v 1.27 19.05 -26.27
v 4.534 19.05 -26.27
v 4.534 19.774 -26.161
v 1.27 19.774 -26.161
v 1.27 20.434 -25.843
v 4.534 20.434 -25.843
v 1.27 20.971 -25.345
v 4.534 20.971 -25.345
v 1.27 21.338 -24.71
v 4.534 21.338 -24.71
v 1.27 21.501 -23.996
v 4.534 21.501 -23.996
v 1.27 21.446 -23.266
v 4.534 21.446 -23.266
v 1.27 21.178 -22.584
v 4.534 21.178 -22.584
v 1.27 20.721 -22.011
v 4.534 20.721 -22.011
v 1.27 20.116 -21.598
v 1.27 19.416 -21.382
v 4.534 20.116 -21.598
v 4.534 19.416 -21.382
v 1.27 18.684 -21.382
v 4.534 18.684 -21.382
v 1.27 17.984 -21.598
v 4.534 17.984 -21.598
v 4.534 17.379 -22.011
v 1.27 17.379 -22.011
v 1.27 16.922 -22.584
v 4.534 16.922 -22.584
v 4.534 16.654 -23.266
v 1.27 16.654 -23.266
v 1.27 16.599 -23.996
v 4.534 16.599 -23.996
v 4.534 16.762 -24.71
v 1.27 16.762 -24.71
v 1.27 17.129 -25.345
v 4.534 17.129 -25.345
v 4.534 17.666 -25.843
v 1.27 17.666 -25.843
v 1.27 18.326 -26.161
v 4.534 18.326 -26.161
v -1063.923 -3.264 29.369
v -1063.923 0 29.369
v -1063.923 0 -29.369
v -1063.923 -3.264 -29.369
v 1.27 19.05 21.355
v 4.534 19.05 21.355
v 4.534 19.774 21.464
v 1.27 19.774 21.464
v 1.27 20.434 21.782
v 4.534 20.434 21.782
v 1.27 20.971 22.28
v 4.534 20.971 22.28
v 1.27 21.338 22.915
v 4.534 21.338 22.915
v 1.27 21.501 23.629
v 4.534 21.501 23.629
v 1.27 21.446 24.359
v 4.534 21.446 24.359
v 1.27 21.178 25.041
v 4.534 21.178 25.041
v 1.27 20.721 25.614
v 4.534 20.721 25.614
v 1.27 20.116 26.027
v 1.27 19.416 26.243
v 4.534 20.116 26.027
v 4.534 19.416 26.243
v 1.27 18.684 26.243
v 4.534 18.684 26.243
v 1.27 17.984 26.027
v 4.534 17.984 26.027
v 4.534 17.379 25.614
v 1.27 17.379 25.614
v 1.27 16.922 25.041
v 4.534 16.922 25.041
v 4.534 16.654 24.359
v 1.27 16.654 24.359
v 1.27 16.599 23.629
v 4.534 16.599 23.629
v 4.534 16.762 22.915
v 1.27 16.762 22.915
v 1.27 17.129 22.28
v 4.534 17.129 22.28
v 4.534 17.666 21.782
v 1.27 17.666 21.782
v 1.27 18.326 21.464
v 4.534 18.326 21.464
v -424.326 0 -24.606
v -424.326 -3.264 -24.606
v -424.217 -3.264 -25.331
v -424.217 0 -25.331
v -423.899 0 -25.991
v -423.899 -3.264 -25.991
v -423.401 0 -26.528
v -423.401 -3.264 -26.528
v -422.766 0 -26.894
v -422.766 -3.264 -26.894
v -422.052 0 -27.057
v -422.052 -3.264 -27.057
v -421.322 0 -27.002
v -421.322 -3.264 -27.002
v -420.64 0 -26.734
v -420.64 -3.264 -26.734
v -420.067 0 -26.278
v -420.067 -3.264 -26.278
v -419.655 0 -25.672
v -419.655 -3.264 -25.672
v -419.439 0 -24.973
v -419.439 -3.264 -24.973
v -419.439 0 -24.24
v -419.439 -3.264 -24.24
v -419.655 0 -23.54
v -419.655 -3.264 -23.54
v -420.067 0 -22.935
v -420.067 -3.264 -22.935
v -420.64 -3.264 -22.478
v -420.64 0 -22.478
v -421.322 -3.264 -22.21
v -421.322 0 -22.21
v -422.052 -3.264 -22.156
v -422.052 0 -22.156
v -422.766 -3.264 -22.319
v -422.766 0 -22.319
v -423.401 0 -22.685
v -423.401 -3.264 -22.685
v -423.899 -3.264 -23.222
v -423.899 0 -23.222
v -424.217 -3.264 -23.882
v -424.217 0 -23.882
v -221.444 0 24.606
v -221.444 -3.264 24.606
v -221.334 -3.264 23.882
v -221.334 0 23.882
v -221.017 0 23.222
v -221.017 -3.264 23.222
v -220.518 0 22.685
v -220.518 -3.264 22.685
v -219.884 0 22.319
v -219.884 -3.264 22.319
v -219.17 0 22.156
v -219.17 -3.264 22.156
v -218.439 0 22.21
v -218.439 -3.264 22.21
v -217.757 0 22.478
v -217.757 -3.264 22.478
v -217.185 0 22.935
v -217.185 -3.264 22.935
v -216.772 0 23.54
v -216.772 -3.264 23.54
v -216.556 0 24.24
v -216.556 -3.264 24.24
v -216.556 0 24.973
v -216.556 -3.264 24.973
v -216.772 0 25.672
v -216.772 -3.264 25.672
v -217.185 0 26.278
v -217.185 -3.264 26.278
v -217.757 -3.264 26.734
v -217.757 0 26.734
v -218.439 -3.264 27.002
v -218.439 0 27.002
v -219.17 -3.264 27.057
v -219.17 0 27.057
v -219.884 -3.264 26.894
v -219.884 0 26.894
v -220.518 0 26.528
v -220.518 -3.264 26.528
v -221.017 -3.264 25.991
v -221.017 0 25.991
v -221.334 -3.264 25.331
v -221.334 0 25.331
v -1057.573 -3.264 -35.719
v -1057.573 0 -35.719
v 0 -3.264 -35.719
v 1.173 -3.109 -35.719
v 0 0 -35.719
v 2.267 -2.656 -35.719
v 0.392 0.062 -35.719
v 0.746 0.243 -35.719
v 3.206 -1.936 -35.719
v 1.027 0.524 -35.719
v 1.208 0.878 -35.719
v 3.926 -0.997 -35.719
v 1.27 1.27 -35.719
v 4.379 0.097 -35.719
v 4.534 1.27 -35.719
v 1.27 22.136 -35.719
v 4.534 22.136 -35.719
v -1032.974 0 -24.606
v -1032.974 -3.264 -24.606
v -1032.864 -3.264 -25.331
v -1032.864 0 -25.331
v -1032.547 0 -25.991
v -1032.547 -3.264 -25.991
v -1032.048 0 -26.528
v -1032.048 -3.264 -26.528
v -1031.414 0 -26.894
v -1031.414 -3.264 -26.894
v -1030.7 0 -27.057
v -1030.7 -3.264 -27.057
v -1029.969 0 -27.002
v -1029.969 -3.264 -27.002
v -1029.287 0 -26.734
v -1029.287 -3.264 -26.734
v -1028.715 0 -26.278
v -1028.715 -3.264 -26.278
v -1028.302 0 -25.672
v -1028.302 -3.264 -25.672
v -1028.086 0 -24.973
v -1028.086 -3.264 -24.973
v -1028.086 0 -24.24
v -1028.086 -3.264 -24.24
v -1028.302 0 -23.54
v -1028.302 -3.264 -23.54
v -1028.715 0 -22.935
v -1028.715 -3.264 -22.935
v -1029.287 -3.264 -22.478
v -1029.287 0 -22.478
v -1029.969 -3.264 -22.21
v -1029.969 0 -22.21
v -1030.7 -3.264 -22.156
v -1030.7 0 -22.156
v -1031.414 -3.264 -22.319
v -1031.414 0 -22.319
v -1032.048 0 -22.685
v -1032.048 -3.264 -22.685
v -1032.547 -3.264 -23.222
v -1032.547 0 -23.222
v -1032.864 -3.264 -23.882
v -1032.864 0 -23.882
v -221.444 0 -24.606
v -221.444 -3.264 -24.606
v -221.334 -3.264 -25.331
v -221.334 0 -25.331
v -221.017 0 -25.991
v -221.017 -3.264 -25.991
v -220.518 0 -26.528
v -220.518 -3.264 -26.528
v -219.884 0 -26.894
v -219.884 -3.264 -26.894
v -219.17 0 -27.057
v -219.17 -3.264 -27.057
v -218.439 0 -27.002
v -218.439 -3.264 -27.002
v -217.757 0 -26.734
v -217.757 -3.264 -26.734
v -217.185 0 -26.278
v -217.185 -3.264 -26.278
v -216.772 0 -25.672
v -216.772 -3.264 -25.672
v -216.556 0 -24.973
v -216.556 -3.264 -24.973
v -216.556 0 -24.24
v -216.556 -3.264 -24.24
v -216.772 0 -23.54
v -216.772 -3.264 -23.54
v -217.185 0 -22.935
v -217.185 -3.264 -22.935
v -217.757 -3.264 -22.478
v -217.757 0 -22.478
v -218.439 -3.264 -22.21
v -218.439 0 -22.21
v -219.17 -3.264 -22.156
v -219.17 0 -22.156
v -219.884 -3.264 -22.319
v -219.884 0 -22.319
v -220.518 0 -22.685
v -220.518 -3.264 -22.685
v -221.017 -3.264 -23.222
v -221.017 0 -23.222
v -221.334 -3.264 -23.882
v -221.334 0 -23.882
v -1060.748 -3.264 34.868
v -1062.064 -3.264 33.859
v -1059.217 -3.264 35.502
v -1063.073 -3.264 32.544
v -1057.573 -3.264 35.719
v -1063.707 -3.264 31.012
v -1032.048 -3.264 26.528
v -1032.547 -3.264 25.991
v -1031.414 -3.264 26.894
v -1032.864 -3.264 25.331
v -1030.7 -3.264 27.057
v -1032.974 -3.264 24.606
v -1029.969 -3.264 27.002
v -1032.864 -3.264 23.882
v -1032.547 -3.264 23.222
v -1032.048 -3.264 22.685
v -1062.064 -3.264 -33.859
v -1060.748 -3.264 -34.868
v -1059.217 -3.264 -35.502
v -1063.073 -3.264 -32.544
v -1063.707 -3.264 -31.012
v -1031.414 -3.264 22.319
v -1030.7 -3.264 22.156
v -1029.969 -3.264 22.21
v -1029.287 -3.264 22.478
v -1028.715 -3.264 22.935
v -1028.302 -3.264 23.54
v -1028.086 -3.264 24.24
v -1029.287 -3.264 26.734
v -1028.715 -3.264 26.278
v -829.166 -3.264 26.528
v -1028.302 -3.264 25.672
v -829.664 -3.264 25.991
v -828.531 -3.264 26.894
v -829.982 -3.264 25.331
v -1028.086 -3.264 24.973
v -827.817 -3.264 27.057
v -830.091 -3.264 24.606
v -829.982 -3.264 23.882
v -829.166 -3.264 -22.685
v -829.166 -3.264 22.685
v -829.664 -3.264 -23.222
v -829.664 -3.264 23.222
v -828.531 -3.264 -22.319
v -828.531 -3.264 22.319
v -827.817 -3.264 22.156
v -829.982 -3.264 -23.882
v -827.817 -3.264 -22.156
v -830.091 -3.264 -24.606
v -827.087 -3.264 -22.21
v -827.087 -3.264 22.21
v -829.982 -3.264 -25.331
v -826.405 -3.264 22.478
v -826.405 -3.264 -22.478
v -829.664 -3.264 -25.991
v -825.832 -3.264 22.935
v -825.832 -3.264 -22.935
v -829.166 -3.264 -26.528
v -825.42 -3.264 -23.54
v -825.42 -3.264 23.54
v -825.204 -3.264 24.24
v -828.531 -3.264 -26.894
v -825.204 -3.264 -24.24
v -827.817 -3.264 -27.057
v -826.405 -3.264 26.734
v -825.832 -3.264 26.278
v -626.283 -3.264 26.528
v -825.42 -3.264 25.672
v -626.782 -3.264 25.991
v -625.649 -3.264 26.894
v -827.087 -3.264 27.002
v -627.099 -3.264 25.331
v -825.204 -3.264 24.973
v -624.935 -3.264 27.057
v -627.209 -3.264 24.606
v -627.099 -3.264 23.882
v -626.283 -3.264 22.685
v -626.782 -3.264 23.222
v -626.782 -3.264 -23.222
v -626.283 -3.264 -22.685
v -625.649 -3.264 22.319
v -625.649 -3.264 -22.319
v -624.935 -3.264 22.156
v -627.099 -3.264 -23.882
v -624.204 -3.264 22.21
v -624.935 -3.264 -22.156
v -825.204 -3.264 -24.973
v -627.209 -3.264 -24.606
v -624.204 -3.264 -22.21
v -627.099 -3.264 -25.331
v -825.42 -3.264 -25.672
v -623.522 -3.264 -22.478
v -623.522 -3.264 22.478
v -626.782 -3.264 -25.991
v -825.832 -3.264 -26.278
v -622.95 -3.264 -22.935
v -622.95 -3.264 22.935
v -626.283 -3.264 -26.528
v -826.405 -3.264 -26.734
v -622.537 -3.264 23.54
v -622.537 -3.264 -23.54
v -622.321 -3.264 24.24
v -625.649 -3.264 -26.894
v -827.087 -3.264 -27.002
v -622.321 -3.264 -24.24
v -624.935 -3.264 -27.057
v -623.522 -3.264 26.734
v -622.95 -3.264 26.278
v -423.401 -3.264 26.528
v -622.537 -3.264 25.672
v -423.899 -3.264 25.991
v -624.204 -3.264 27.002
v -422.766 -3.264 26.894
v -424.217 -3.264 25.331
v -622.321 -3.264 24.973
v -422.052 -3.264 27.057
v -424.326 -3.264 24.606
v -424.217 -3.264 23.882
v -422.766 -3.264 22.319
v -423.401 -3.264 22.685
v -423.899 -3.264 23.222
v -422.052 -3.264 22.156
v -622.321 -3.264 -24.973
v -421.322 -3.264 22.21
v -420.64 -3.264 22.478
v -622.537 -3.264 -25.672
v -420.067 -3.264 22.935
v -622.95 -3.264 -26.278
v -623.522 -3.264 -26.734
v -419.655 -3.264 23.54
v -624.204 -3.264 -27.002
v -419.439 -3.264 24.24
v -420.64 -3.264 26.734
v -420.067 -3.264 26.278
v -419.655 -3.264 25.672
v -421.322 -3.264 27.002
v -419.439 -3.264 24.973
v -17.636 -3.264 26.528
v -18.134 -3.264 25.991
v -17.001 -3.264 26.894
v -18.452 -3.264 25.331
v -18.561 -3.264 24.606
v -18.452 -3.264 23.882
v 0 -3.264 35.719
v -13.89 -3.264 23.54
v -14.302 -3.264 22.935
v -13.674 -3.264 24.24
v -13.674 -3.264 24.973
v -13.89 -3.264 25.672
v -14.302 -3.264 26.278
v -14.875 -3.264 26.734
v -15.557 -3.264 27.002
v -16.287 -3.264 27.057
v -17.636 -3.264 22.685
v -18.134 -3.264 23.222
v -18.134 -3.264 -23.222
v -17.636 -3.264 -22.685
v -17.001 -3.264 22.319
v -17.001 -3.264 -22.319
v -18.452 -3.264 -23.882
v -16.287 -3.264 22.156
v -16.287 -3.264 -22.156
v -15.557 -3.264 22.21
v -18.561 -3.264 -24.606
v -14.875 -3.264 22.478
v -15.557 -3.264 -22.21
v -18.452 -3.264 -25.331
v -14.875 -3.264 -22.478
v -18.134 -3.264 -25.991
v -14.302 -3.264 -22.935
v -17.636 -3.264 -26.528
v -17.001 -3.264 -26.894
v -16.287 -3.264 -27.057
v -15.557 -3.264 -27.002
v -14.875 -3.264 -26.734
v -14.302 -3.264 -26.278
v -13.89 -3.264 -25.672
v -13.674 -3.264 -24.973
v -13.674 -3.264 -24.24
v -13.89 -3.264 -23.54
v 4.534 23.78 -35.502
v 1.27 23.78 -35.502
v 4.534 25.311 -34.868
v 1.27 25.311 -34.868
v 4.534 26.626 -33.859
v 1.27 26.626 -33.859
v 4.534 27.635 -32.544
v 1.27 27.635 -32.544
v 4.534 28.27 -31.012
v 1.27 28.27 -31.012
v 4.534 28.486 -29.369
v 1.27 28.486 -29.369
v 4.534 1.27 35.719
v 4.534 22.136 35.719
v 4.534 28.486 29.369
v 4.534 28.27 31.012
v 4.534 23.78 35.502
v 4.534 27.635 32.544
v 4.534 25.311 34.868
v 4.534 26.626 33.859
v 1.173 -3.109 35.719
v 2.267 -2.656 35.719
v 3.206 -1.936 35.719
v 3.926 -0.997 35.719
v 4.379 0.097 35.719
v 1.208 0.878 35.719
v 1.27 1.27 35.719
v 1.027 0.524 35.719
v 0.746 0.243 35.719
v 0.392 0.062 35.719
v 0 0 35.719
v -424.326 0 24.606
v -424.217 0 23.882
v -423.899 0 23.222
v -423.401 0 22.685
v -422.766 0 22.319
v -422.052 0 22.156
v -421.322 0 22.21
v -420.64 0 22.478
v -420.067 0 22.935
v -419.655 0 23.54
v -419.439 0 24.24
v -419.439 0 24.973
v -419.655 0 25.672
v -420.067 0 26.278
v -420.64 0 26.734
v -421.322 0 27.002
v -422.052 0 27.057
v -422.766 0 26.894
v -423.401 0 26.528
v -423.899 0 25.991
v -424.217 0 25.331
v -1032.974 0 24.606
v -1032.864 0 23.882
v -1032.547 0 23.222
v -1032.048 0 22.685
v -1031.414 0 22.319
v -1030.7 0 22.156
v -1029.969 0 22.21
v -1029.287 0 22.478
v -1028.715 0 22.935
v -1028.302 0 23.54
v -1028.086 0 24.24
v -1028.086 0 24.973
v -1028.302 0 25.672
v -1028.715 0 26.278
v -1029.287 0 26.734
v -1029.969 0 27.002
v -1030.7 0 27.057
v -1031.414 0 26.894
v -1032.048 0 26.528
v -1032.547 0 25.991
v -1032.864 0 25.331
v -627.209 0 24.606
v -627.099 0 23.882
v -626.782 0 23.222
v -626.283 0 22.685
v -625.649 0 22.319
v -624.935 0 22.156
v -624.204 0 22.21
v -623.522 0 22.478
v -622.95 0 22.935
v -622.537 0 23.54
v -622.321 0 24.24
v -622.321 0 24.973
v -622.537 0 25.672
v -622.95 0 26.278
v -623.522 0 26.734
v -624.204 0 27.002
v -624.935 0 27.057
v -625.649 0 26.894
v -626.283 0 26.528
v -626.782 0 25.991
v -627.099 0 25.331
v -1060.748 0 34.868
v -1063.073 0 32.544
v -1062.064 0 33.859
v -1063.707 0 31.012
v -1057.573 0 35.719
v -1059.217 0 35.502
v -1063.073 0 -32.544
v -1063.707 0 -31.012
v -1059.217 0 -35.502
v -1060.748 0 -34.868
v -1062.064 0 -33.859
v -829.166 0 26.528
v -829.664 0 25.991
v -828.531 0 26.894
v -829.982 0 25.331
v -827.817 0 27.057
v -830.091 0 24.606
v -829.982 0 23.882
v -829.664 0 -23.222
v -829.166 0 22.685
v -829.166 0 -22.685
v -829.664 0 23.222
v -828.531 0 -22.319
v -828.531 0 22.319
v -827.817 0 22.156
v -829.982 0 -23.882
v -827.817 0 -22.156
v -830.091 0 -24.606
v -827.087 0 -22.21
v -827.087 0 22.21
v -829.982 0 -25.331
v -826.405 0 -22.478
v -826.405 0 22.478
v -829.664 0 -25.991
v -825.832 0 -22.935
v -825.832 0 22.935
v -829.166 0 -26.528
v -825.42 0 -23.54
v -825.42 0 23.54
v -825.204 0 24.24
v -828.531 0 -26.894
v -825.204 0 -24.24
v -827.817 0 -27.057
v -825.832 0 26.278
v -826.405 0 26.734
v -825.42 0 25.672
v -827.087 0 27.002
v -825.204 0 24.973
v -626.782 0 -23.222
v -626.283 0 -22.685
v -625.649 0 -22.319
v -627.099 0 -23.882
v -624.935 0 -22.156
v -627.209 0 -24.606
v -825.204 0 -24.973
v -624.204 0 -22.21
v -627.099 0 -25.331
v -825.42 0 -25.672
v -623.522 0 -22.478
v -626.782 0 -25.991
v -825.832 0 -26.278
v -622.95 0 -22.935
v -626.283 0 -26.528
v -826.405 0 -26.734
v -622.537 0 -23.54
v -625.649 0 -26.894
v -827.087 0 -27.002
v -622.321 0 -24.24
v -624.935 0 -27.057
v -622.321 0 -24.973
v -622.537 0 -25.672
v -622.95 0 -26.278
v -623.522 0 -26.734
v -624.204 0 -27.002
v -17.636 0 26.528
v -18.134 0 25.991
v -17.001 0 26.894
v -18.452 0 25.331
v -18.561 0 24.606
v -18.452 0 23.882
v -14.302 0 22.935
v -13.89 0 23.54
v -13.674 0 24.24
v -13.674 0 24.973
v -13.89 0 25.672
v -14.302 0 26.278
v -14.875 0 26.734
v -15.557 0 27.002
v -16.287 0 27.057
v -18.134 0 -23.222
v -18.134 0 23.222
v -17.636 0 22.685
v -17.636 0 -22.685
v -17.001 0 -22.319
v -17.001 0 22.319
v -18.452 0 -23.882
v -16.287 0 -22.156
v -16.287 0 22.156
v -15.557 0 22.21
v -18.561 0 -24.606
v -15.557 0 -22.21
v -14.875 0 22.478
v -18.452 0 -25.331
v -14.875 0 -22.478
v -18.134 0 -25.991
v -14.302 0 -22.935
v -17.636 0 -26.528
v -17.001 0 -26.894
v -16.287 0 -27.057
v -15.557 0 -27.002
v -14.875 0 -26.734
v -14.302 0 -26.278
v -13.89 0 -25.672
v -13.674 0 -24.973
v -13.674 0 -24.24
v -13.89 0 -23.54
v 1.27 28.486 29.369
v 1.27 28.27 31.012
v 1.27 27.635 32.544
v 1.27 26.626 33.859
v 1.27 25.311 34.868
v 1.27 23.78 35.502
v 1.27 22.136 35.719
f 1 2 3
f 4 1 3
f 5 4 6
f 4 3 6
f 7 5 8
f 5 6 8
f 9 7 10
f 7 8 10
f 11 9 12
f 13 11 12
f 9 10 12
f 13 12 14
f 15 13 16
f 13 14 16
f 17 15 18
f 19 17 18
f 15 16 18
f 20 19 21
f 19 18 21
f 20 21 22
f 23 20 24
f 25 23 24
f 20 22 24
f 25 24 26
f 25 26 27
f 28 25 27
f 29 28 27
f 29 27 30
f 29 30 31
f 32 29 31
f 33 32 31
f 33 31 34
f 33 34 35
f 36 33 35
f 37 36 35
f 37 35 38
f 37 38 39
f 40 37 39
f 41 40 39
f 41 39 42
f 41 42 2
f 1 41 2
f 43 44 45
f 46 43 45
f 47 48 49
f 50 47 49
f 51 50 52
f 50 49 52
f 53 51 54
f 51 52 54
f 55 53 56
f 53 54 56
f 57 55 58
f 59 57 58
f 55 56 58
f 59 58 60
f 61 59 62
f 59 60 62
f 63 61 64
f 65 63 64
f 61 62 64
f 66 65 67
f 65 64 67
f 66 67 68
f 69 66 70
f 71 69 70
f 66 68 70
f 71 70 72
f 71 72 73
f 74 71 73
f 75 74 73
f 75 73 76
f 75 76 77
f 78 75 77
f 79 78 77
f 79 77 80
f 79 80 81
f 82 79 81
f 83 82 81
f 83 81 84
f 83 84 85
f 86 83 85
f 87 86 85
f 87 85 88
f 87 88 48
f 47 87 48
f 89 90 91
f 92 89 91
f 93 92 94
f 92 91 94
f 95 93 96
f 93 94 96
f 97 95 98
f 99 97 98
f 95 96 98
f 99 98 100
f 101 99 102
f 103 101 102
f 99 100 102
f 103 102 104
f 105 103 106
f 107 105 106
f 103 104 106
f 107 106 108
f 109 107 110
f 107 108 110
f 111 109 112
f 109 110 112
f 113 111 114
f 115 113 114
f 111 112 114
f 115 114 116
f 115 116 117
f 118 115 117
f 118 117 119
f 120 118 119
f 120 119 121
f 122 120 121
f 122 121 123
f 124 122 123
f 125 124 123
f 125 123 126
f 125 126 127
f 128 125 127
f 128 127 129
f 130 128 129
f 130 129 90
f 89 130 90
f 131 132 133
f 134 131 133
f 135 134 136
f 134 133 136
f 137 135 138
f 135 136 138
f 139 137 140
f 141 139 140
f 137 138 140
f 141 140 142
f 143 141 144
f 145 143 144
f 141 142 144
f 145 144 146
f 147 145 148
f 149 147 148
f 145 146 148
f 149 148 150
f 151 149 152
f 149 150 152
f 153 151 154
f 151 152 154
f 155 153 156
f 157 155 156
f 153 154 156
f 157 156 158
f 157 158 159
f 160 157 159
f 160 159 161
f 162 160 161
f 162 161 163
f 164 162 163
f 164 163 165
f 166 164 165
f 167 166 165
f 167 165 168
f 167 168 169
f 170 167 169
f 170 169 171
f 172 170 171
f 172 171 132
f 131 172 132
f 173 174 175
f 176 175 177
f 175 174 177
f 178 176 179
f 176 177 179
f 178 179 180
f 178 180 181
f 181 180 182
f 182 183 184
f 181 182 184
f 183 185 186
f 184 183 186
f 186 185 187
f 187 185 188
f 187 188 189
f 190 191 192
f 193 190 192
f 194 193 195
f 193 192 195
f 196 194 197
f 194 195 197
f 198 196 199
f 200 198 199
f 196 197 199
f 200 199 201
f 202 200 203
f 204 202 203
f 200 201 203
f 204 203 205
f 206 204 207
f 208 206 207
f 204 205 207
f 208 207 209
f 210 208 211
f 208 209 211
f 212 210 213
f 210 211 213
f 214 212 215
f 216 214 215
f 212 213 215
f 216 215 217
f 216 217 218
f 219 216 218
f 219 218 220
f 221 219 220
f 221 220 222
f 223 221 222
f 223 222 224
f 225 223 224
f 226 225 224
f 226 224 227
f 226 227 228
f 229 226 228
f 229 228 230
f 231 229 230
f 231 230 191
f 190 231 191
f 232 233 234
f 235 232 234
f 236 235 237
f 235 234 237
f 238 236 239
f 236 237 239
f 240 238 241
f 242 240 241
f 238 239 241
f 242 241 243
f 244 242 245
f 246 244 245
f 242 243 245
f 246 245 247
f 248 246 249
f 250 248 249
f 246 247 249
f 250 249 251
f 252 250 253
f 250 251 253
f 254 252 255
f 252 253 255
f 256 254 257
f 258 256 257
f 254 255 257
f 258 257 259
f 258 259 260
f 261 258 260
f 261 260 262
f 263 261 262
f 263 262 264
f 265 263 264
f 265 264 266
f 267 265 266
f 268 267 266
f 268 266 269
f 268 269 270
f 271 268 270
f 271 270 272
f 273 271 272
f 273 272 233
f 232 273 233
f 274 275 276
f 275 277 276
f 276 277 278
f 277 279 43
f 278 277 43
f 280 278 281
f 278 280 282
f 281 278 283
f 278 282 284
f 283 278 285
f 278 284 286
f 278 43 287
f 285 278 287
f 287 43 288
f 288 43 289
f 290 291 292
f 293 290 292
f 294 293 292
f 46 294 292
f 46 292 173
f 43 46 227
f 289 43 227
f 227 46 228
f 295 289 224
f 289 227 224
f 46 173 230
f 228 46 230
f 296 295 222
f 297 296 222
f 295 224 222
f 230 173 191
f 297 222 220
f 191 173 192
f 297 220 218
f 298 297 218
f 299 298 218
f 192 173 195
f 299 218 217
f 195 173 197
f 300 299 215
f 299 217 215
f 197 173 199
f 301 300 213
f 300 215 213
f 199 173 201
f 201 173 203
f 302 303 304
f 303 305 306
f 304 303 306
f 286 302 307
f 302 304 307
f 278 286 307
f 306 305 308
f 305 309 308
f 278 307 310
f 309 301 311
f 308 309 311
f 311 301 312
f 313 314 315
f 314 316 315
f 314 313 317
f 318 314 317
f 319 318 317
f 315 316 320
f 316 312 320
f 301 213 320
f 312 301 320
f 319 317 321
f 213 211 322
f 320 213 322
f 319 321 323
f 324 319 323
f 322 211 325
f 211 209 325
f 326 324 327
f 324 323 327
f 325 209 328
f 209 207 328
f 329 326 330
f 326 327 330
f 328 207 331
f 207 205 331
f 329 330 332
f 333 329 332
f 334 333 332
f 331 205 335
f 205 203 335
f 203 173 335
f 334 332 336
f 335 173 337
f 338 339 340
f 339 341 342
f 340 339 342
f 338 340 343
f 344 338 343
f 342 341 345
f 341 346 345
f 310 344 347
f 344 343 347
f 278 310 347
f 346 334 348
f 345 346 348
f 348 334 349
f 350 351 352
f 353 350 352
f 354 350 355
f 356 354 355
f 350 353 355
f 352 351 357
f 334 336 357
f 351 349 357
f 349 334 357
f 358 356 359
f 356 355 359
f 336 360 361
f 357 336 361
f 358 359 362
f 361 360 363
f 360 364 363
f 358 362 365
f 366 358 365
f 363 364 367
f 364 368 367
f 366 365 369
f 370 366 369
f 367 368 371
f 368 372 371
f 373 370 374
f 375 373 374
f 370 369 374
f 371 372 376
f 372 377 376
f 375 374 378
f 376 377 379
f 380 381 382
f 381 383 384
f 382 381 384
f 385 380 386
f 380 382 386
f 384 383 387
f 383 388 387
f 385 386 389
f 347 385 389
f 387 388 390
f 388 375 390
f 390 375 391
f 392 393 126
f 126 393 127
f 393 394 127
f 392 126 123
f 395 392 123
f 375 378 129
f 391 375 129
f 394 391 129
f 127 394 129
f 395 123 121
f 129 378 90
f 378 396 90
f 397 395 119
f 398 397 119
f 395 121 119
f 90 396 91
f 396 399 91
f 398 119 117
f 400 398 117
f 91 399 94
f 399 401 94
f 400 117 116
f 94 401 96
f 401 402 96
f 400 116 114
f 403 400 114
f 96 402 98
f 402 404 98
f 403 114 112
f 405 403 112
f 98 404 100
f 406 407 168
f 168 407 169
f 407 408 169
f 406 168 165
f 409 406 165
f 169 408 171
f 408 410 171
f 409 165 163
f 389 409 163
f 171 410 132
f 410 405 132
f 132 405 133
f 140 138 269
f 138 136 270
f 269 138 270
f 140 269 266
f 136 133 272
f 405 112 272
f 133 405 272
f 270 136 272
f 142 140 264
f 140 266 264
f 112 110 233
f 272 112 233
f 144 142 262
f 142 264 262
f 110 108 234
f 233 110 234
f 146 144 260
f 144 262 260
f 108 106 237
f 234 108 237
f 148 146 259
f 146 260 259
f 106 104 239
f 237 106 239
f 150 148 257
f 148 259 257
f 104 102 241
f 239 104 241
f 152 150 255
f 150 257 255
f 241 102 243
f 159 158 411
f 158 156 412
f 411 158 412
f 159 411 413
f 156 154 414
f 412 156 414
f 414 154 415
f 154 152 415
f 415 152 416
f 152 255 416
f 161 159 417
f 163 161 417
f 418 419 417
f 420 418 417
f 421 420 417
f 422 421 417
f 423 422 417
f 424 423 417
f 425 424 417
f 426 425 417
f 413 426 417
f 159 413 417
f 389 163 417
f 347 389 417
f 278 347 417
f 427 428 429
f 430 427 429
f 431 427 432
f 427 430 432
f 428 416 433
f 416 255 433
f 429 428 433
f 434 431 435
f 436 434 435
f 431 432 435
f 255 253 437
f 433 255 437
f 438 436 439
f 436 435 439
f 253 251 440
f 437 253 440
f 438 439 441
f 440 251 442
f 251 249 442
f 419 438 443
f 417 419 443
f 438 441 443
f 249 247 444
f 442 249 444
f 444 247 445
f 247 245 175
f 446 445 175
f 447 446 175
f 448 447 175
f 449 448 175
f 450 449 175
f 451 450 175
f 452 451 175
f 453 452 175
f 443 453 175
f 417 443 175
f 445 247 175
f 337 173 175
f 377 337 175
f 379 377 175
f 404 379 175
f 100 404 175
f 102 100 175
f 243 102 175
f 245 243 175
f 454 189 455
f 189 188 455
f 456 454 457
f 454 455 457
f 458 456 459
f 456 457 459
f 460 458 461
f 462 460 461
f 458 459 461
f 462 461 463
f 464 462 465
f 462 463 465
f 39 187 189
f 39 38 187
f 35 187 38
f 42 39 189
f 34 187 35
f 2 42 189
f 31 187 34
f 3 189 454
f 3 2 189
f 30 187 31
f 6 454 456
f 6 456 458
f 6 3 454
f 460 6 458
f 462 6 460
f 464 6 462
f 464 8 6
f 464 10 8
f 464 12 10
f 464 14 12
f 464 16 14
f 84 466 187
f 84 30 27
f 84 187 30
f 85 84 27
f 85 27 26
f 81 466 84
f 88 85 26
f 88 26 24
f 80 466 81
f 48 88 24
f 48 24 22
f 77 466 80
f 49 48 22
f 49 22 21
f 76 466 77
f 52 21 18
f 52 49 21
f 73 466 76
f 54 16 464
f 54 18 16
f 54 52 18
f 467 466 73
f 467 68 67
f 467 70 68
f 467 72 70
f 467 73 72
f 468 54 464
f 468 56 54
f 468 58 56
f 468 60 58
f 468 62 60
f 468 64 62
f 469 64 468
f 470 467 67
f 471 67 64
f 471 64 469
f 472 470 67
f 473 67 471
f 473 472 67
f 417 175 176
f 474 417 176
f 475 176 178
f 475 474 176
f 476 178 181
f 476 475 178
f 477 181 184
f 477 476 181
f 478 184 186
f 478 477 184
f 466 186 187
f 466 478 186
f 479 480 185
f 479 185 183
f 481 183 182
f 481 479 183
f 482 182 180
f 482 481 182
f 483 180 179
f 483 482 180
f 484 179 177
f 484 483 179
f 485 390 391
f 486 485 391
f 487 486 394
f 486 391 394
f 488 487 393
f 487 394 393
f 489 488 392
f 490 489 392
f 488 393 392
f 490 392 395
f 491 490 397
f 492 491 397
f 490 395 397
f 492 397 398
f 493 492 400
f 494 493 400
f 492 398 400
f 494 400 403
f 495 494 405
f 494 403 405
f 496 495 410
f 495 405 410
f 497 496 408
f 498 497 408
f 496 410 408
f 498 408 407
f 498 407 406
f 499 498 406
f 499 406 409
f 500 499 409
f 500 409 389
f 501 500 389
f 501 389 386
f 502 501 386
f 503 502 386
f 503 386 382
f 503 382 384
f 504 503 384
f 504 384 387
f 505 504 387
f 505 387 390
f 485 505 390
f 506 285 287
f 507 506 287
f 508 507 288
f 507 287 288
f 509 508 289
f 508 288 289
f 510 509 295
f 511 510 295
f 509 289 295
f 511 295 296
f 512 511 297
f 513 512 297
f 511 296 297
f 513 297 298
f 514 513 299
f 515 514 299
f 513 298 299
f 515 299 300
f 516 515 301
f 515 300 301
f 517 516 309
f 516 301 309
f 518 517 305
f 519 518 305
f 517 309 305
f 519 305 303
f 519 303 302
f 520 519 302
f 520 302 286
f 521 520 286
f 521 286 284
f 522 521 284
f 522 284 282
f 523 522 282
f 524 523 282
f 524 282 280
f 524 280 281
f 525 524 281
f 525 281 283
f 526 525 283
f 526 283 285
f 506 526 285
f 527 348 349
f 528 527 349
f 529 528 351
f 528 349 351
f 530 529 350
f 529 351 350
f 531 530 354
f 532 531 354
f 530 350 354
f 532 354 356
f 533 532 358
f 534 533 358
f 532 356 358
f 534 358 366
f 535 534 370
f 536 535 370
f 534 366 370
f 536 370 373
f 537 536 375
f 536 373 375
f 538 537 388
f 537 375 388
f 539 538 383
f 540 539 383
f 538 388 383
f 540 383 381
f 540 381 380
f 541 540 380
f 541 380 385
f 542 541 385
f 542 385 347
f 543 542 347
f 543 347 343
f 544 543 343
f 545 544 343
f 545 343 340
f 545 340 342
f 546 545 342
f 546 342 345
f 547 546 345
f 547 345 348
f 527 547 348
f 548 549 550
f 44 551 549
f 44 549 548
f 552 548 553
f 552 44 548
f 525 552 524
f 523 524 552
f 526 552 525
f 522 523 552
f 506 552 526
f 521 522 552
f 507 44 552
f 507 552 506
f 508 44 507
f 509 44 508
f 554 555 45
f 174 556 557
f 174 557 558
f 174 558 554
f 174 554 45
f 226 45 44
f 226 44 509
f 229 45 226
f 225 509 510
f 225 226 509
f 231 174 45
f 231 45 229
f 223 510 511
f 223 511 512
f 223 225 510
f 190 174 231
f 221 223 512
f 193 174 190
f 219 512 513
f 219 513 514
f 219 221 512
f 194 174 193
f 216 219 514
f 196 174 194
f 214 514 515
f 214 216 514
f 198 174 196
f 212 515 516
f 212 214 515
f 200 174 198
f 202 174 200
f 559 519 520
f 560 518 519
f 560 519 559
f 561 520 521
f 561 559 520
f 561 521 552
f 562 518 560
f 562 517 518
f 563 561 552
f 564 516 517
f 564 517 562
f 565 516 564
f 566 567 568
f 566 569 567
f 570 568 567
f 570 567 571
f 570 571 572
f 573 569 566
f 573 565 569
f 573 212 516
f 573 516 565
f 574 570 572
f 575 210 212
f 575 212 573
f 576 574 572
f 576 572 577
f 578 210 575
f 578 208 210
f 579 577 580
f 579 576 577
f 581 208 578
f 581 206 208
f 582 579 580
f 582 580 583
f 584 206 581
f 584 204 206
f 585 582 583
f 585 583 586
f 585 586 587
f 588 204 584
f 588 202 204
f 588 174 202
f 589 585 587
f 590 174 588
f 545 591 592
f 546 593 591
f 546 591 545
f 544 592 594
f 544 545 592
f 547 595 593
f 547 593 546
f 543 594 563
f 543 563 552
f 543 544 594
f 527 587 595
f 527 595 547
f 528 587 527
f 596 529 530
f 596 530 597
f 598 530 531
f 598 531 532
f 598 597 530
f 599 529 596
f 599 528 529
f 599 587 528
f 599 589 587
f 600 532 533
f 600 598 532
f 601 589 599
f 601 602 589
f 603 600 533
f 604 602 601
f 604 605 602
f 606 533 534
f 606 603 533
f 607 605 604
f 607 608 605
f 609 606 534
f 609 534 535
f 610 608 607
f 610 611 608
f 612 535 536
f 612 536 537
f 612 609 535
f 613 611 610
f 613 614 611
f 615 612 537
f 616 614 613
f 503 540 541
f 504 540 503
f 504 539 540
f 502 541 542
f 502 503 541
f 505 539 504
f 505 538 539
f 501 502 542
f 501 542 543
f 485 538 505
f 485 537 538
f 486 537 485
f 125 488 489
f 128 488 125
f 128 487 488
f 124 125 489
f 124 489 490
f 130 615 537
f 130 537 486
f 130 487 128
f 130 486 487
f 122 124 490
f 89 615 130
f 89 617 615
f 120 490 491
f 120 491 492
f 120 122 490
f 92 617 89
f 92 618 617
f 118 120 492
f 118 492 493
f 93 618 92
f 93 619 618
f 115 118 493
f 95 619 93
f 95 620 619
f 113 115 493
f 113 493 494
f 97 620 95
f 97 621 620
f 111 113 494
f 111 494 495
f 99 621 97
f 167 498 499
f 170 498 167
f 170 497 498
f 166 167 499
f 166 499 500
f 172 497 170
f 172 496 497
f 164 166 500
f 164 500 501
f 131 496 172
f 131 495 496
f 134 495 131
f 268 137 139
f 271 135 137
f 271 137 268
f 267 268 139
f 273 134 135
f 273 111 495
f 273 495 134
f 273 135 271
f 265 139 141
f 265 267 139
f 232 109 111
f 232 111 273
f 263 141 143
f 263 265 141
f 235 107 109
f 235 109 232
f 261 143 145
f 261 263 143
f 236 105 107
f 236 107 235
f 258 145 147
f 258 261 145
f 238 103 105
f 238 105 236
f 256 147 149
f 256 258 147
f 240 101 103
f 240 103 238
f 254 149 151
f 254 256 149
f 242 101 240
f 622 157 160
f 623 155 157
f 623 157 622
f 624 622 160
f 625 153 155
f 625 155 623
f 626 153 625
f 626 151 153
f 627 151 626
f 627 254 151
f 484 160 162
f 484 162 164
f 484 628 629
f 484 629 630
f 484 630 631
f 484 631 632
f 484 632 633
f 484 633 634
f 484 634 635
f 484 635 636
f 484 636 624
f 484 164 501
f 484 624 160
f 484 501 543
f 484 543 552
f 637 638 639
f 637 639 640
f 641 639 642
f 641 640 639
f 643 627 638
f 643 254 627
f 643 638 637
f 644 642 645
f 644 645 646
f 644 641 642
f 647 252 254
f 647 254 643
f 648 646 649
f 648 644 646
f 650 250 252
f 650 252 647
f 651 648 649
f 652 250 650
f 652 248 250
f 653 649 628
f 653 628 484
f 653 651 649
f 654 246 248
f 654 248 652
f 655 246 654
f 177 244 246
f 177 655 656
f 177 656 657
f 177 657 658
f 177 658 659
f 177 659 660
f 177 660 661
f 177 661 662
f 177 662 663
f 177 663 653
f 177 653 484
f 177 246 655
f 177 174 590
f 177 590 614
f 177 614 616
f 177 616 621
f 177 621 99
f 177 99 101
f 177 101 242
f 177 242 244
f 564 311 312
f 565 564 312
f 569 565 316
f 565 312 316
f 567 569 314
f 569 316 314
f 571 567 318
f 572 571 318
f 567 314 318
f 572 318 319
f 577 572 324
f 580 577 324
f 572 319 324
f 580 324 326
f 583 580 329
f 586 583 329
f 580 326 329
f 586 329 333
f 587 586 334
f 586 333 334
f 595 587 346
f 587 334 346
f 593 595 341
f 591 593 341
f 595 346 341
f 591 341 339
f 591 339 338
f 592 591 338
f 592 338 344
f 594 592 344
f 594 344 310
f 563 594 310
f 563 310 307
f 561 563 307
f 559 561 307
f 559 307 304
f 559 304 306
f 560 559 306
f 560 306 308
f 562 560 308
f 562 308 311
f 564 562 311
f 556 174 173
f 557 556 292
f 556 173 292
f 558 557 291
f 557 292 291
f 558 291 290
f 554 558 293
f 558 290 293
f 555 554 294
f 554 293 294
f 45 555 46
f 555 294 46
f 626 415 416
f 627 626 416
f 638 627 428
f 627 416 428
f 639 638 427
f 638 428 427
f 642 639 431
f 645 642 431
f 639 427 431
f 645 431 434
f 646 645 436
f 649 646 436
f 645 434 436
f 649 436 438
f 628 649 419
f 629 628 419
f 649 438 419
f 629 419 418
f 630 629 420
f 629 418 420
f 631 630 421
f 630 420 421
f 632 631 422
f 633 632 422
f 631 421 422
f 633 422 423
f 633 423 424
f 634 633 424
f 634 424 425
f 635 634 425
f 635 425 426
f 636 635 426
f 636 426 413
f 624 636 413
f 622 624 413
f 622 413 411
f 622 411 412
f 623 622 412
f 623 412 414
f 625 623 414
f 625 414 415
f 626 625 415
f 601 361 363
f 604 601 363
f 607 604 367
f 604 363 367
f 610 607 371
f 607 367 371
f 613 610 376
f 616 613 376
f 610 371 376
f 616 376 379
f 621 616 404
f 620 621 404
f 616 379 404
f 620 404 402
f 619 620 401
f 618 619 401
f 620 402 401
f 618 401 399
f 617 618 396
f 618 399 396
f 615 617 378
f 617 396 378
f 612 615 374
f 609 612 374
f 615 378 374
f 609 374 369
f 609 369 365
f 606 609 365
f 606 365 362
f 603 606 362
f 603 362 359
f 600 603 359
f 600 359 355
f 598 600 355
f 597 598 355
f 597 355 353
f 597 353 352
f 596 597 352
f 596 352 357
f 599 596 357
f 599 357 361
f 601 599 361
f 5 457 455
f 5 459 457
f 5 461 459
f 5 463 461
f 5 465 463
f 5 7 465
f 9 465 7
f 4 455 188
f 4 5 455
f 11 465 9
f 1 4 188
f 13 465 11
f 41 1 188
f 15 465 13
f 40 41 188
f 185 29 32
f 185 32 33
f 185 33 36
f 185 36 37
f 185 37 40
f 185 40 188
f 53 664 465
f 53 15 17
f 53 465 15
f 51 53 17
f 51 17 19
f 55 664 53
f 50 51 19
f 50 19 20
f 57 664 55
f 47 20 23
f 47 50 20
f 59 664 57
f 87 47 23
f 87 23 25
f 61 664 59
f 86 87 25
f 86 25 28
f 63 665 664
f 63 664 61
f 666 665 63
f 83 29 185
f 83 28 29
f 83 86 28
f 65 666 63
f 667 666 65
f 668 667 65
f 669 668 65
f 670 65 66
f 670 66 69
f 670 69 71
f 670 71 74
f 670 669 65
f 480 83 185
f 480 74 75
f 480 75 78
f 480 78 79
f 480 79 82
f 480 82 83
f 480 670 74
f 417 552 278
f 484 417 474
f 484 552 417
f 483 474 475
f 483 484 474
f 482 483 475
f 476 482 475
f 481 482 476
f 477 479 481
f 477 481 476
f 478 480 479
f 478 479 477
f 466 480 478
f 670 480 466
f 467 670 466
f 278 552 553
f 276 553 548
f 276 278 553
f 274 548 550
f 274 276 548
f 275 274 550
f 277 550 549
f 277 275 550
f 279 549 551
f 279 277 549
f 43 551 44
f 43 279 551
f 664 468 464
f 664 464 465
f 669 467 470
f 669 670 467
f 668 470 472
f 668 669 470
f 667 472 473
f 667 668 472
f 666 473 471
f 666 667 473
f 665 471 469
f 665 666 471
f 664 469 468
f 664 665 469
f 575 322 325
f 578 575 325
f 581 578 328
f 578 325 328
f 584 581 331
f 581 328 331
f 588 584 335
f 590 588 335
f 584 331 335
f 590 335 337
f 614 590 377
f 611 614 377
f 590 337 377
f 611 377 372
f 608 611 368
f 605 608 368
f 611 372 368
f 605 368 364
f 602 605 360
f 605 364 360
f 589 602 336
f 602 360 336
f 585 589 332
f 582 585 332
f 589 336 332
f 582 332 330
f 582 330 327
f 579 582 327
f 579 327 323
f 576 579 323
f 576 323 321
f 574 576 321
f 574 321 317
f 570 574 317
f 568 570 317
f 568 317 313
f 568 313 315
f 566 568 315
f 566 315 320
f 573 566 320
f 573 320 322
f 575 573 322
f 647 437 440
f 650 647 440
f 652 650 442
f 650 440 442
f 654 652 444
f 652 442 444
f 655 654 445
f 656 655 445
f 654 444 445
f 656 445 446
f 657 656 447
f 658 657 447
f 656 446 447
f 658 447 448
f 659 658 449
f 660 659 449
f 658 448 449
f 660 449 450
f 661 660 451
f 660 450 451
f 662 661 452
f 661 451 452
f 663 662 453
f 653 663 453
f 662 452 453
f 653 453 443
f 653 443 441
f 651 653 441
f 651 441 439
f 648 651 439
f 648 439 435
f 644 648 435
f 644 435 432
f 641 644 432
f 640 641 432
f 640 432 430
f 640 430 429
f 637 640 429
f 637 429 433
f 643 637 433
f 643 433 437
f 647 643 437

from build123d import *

# Parameters (mm, degrees)
SKETCH1_W                    = 1063.92345
SKETCH1_H                    = 71.4375
BASE_FLANGE1_DEPTH           = 3.2639
EDGE_FLANGE2_DEPTH           = 71.4375
F_10_0_1935_DIAMETER_HOLE1_D = 4.9149
LPATTERN1_COUNT              = 6
LPATTERN1_PITCH              = 202.8825
F_10_0_1935_DIAMETER_HOLE2_D = 4.9149
FILLET1_R                    = 6.35


# Sheet-metal steps are written as plain solids
with BuildPart() as part:
    # Sketch1 → Base-Flange1 (new body)
    with BuildSketch(Plane(origin=(0, 0, 0), x_dir=(1, 0, 0), z_dir=(0, 1, 0))):
        with Locations((-531.961725, 0)):
            Rectangle(SKETCH1_W, SKETCH1_H)
    extrude(amount=-BASE_FLANGE1_DEPTH)

    # Edge-Flange2 section (across the edge) → Edge-Flange2 (add)
    with BuildSketch(Plane(origin=(1.27, 0, 35.71875), x_dir=(-1, 0, 0), z_dir=(0, 0, -1))):
        with BuildLine():
            Line((-3.2639, 1.27), (-3.2639, 28.4861))
            Line((-3.2639, 28.4861), (0, 28.4861))
            Line((0, 28.4861), (0, 1.27))
            ThreePointArc((0, 1.27), (0.371974388, 0.371974388), (1.27, 0))
            Line((1.27, 0), (1.27, -3.2639))
            ThreePointArc((1.27, -3.2639), (-1.935951435, -1.935951435), (-3.2639, 1.27))
        make_face()
    extrude(amount=EDGE_FLANGE2_DEPTH)

    # #10 (0.1935) Diameter Hole1 (through all)
    with Locations(Plane(origin=(0, 0, 0), x_dir=(1, 0, 0), z_dir=(0, 1, 0))):
        with Locations((-16.1036, 24.60625), (-16.1036, -24.60625)):
            f_10_0_1935_diameter_hole1 = Hole(F_10_0_1935_DIAMETER_HOLE1_D / 2)

    # LPattern1: #10 (0.1935) Diameter Hole1 ×6
    with Locations(*[(-i * LPATTERN1_PITCH, 0, 0) for i in range(1, LPATTERN1_COUNT)]):
        add(f_10_0_1935_diameter_hole1, mode=Mode.SUBTRACT)

    # #10 (0.1935) Diameter Hole2 (through all)
    with Locations(Plane.ZY.offset(-1.27)):
        with Locations((-23.8125, 19.05), (23.8125, 19.05)):
            Hole(F_10_0_1935_DIAMETER_HOLE2_D / 2)

    # Fillet1
    fillet1_edges = [part.edges().sort_by_distance(p)[0] for p in [
        (2.90195, 28.4861, 35.71875),
        (2.90195, 28.4861, -35.71875),
        (-1063.92345, -1.63195, -35.71875),
        (-1063.92345, -1.63195, 35.71875),
    ]]
    fillet(fillet1_edges, radius=FILLET1_R)


solid = part.part
